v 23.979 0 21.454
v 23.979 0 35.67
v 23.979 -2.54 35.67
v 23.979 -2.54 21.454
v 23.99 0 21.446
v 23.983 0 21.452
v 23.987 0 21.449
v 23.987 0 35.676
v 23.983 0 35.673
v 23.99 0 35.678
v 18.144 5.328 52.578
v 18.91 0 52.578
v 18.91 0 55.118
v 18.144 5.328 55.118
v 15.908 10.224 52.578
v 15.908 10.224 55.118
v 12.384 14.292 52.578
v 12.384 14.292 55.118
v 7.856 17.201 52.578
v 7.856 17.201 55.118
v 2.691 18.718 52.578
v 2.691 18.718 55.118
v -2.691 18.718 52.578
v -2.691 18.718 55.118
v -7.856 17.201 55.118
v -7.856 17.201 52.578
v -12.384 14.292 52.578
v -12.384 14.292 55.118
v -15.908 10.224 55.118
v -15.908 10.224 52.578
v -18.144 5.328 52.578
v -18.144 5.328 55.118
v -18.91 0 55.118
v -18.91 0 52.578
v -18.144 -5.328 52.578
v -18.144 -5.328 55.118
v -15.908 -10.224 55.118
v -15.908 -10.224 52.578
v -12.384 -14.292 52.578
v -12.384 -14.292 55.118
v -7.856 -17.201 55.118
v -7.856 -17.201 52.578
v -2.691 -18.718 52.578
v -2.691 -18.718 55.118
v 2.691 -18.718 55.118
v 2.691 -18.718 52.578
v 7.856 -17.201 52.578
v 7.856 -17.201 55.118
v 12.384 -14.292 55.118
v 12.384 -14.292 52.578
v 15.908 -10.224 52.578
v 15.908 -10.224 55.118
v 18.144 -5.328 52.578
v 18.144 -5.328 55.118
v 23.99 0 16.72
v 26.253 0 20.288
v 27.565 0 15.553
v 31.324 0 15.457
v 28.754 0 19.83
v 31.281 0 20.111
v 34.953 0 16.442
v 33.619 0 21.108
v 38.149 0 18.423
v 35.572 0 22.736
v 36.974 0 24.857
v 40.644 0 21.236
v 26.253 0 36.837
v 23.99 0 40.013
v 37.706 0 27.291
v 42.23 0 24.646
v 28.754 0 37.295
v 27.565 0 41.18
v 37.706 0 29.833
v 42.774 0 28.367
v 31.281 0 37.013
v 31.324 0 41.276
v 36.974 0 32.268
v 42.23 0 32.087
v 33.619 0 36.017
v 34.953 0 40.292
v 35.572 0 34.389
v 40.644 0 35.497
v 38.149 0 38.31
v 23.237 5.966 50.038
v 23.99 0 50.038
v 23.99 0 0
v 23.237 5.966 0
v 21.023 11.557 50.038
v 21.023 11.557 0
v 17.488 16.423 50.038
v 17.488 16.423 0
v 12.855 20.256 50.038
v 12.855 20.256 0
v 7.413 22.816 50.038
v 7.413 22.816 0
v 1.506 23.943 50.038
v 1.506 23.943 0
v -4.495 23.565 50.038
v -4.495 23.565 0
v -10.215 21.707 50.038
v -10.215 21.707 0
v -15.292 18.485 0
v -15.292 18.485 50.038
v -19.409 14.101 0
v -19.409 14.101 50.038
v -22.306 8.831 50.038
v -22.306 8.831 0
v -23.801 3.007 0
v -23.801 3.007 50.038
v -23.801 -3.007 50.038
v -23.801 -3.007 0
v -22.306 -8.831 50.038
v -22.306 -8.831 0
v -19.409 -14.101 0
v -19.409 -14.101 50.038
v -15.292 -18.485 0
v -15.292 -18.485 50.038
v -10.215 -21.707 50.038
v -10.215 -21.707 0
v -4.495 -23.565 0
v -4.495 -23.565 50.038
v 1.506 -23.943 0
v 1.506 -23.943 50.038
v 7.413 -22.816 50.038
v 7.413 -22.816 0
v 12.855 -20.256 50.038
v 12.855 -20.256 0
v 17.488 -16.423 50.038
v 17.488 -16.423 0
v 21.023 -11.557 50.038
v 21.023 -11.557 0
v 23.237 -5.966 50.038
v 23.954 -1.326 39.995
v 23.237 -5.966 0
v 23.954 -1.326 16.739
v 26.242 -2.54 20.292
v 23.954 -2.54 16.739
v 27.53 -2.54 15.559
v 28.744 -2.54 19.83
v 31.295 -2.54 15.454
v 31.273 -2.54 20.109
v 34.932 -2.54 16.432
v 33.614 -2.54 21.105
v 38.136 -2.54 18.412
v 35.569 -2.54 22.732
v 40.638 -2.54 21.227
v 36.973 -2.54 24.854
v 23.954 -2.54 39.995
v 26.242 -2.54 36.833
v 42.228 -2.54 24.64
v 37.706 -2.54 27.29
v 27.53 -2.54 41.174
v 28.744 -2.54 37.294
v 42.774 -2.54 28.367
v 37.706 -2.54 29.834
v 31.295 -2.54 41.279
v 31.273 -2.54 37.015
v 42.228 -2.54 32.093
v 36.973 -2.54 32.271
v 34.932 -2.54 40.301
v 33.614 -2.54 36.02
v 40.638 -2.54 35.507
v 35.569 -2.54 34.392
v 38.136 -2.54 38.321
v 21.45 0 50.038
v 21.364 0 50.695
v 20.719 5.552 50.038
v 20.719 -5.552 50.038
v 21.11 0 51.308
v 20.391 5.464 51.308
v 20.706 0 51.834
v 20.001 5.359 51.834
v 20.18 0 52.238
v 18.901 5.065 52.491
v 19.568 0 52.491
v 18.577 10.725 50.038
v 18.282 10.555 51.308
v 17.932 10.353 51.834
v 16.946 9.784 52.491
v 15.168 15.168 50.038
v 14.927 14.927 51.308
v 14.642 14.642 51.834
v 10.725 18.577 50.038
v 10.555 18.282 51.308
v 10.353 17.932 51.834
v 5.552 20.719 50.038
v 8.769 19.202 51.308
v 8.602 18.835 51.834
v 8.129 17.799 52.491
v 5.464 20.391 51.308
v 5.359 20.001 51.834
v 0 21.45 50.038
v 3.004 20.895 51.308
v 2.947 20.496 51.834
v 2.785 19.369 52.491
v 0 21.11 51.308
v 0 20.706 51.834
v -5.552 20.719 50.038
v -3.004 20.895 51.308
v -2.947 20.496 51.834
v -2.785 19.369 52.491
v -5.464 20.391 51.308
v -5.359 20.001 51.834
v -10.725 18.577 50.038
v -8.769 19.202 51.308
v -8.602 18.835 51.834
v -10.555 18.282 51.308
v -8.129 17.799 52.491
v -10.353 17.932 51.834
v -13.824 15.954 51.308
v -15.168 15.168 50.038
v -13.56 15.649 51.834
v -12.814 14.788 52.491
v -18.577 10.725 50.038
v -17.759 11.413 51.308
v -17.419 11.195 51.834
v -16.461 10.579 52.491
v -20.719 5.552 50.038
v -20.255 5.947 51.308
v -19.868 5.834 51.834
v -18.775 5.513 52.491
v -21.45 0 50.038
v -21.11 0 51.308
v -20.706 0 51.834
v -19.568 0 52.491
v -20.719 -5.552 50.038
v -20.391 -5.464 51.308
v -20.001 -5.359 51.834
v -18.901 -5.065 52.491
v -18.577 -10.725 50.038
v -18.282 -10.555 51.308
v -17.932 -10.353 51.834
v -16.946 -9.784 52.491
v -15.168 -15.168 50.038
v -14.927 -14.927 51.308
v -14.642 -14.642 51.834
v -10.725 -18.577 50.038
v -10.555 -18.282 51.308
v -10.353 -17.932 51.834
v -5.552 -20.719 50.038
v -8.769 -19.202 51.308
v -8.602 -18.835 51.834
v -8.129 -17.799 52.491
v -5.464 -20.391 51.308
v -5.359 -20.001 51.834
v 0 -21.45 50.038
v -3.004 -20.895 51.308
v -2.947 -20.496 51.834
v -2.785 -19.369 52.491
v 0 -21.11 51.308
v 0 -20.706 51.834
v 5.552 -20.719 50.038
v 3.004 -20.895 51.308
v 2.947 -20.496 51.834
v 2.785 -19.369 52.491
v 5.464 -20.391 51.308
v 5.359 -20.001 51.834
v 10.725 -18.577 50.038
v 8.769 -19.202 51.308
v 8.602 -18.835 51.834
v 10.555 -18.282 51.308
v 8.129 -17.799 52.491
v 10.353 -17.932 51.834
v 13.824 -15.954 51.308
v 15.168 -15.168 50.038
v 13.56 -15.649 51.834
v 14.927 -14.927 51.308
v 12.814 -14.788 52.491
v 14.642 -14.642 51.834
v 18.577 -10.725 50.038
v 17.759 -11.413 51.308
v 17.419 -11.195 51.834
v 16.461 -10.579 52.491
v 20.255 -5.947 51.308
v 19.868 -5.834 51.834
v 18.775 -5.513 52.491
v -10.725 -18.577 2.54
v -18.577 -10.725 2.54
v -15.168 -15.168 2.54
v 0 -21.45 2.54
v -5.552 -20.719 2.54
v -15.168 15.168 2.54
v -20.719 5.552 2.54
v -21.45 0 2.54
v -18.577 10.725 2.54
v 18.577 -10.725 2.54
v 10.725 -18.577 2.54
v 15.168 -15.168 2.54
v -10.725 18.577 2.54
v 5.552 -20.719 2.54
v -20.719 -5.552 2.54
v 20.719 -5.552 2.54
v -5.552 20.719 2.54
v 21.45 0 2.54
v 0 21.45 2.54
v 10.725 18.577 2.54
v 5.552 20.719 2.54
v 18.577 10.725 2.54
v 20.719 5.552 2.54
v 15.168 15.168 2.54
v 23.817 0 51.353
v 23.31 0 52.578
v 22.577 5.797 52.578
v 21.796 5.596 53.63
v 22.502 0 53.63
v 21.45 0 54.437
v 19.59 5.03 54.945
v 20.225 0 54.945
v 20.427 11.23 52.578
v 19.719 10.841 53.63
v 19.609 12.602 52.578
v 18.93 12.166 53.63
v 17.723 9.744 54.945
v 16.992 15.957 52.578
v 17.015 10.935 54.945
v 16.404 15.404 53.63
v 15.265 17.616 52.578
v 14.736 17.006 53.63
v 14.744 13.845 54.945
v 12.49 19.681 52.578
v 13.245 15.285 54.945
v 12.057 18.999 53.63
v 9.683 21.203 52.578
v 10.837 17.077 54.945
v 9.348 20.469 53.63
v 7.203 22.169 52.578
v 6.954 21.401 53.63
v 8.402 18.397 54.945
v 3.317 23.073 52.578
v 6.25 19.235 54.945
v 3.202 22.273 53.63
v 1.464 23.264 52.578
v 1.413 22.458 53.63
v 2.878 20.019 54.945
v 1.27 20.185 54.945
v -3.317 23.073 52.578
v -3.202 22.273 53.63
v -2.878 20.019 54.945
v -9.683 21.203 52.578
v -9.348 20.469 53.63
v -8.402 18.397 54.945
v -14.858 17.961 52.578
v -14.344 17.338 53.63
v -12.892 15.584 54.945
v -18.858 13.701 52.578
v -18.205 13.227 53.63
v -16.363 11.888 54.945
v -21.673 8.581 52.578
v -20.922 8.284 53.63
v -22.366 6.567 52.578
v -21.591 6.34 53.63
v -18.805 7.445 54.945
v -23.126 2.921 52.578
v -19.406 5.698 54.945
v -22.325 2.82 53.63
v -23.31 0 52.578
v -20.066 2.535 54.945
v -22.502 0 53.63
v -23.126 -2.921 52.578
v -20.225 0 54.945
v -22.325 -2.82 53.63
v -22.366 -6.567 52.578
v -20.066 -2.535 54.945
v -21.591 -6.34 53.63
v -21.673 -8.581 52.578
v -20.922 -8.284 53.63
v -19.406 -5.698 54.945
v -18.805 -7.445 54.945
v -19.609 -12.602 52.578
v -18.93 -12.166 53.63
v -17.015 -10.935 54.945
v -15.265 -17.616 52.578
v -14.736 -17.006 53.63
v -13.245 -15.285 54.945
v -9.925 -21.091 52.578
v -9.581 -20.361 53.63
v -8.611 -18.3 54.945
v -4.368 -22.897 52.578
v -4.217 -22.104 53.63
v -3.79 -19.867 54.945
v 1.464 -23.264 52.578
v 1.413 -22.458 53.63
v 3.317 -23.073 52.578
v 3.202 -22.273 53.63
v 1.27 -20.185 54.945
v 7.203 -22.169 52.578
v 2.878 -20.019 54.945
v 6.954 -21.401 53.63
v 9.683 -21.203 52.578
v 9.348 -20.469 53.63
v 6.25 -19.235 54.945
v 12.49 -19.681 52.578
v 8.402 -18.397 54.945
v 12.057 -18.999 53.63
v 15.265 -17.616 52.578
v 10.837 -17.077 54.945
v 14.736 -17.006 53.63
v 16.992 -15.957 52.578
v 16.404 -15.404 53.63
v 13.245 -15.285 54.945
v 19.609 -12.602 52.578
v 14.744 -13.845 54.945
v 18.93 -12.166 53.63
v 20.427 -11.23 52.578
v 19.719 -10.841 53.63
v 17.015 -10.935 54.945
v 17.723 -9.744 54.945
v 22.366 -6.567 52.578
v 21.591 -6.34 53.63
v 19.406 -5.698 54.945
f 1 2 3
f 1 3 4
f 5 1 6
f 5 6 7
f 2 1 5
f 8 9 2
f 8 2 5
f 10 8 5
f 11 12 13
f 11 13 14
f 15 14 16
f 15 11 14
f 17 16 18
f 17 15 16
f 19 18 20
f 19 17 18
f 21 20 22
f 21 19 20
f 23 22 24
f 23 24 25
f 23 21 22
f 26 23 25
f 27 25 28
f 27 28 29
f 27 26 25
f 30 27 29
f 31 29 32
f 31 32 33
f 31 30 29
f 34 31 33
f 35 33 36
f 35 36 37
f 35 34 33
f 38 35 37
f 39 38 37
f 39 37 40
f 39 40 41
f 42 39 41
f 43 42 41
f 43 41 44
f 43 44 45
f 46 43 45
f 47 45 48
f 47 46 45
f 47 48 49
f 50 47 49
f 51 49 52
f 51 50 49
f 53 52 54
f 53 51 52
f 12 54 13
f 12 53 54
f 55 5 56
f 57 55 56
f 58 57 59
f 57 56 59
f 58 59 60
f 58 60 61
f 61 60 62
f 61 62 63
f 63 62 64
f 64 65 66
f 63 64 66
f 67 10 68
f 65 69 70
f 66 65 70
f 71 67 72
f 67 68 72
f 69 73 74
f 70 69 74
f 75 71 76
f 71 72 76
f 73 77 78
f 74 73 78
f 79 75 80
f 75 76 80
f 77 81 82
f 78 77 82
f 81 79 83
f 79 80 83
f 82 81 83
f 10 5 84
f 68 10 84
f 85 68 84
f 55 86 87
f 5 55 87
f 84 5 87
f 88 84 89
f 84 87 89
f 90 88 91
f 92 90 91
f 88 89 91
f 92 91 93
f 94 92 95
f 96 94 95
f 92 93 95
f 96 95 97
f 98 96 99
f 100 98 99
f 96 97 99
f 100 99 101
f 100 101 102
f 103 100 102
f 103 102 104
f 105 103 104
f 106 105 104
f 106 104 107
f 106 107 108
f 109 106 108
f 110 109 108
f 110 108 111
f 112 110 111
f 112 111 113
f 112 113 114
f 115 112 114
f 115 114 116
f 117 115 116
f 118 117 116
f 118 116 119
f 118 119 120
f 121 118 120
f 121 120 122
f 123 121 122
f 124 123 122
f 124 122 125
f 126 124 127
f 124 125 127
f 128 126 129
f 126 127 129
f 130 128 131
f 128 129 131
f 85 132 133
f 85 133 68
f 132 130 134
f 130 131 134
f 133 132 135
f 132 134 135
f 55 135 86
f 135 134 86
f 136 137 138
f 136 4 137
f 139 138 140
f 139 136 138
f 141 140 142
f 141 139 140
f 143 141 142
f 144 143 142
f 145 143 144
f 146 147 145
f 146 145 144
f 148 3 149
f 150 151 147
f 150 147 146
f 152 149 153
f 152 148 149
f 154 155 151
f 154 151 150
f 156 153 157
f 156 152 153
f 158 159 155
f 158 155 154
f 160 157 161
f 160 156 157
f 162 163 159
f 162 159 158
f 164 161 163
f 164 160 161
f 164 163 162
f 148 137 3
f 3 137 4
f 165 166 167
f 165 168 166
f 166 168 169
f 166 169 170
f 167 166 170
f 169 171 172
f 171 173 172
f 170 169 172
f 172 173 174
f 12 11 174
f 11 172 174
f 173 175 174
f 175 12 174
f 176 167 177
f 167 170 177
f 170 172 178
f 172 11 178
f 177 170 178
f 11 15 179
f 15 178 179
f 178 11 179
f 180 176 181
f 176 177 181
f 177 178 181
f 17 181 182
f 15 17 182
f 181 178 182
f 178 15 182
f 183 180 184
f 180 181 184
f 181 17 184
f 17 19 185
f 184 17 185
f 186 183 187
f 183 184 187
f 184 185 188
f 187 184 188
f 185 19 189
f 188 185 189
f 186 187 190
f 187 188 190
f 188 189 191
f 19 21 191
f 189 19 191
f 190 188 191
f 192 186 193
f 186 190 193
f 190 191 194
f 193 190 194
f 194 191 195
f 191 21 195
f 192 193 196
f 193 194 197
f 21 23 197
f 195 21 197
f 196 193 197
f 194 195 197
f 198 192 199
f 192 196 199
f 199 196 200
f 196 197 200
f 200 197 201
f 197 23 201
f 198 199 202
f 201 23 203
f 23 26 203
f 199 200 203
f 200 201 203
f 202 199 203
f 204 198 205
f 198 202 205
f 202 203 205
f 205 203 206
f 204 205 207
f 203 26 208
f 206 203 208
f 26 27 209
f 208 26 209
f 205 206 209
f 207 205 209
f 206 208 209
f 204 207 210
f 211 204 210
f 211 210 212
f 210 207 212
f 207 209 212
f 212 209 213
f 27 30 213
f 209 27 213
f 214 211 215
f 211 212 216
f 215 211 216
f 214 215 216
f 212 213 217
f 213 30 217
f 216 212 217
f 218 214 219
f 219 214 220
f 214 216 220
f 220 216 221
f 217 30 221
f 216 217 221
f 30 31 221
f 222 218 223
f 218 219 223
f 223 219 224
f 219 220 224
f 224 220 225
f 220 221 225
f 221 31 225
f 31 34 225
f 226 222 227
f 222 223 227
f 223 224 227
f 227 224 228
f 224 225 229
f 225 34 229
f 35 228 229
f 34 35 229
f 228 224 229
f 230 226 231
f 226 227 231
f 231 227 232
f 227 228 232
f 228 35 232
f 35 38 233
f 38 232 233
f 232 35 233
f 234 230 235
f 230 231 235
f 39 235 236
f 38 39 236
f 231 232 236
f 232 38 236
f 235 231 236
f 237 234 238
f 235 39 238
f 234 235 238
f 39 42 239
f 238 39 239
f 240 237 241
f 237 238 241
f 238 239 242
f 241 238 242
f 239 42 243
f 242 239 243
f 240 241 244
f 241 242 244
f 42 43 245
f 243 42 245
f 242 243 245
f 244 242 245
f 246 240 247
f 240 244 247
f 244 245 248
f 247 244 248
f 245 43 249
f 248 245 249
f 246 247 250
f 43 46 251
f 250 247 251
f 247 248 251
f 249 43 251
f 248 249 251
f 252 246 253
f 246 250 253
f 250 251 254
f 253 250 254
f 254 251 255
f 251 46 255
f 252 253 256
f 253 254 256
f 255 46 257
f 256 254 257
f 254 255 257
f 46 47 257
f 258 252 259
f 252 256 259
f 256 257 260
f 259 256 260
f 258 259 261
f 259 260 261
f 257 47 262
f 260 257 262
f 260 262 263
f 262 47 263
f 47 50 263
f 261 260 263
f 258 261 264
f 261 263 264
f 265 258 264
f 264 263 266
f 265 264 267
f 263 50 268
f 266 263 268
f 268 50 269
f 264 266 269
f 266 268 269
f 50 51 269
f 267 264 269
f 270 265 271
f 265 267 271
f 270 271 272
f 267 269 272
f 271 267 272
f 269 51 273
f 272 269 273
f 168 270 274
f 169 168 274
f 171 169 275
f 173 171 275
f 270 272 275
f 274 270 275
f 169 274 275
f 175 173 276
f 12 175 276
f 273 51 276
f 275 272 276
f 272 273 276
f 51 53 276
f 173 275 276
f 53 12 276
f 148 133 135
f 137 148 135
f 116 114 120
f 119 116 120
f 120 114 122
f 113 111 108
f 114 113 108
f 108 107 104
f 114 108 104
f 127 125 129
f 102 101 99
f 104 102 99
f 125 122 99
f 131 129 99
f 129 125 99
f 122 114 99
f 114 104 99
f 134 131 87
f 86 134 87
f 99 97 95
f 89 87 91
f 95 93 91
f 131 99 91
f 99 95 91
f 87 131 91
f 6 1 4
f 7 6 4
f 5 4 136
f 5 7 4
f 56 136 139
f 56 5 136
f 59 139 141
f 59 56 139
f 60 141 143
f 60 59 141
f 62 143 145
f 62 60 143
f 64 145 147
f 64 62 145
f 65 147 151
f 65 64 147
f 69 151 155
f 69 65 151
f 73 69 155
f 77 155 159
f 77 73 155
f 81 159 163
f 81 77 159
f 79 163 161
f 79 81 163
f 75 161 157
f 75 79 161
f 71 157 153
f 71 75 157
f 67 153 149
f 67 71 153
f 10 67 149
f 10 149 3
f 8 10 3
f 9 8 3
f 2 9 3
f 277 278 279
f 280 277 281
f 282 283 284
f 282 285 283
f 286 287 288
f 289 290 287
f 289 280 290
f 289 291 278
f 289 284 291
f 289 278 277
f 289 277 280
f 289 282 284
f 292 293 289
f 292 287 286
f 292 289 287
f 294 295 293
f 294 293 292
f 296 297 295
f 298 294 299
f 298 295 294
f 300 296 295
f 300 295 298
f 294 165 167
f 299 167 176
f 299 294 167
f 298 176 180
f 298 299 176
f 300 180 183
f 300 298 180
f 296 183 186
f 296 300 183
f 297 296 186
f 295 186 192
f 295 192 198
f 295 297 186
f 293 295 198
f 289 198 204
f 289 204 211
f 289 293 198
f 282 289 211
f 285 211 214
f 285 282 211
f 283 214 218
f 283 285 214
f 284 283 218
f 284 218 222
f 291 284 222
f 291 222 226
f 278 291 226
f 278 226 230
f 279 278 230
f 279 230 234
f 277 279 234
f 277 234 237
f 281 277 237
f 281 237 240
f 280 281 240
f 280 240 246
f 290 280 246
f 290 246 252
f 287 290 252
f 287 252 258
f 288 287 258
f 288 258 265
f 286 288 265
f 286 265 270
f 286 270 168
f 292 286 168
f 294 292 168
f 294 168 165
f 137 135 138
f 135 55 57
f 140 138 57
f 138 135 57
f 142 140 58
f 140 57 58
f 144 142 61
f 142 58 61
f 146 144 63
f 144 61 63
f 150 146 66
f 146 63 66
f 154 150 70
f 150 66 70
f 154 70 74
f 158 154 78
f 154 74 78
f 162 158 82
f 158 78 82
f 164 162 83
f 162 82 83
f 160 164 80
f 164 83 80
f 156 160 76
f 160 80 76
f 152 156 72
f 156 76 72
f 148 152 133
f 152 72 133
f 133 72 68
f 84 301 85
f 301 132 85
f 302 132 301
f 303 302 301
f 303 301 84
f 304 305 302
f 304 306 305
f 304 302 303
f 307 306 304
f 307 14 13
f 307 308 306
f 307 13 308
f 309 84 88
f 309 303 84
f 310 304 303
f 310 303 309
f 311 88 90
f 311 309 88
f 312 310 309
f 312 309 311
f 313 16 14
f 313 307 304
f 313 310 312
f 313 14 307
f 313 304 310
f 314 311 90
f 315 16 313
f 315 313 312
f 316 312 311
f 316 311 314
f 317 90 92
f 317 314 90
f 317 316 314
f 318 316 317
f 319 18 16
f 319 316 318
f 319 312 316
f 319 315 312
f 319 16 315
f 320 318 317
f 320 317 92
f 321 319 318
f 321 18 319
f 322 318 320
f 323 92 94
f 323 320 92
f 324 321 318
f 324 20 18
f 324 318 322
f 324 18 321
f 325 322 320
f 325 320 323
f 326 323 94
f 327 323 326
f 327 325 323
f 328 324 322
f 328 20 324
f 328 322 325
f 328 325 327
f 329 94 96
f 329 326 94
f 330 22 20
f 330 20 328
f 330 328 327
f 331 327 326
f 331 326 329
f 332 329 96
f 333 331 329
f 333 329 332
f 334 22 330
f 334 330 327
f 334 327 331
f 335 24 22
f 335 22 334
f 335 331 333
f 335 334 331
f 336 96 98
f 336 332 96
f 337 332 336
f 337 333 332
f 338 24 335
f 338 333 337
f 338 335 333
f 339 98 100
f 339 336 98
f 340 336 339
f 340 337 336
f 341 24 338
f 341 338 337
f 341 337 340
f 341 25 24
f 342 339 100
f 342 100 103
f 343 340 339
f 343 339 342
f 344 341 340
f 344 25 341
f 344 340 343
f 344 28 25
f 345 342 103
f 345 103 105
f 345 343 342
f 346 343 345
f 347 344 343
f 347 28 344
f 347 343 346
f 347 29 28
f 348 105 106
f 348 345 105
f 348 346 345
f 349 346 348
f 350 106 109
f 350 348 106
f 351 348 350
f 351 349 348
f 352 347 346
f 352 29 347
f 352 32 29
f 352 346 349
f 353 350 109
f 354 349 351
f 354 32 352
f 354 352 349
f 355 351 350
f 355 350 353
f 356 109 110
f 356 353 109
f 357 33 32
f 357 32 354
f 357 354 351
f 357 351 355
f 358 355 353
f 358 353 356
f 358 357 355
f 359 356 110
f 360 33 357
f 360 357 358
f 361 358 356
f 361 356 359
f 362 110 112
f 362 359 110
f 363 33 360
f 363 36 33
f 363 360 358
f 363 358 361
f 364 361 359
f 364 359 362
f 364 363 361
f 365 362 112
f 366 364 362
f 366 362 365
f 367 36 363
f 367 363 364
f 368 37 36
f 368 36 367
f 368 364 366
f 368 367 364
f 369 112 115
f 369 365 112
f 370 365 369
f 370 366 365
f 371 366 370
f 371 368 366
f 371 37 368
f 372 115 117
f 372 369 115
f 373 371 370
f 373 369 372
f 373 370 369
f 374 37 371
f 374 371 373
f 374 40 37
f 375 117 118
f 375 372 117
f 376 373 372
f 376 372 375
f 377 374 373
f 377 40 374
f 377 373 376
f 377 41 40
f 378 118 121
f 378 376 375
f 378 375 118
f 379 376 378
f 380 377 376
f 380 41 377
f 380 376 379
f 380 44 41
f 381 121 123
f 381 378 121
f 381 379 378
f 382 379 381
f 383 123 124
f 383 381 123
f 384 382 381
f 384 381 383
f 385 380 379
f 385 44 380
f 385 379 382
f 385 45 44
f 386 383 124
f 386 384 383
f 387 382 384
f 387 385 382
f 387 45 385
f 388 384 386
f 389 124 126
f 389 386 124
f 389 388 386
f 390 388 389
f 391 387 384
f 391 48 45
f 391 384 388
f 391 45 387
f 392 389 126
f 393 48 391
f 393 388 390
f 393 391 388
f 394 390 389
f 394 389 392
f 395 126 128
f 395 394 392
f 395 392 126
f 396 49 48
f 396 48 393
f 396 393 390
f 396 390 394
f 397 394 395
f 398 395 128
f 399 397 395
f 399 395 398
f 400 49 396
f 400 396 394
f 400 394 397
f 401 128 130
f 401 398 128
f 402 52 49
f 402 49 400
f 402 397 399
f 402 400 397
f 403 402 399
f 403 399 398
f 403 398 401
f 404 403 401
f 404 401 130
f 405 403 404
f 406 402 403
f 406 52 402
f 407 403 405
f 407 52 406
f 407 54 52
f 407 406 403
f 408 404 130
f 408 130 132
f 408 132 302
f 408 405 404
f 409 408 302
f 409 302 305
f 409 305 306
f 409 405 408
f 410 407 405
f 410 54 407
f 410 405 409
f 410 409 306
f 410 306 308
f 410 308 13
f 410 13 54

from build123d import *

# Parameters (mm, degrees)
F0_R     = 23.9903837703
F1_DEPTH = 55.118
F2_R     = 5.08
F3_T     = -2.54
F5_DEPTH = 2.54
F7_DEPTH = 4.1402


# Not quite as in the source:
# - a shell that OpenCascade refuses in one call is made with other operations: the cavity is built on its own and cut out


with BuildPart() as f1:
    # F0 (on Top) → F1 (new body)
    with BuildSketch(Plane.XY):
        Circle(F0_R)
    extrude(amount=F1_DEPTH)

    # F2
    f2_edges = [f1.edges().sort_by_distance(p)[0] for p in [
        (-23.990384, 0, 55.118),
    ]]
    fillet(f2_edges, radius=F2_R)

    # F3: a shell. OpenCascade refuses it in one call, so the cavity is built on its own and cut out:
    # the body offset inwards by the wall thickness, plus a prism from it out through each open face.
    f3_core = offset(f1.part, amount=F3_T, mode=Mode.PRIVATE)
    f3_exits = [f3_core.faces().sort_by_distance(p)[0] for p in [
        (0, 0, 52.578),
    ]]
    add(f3_core, mode=Mode.SUBTRACT)
    extrude(f3_exits, amount=-F3_T, mode=Mode.SUBTRACT)

    # F4 (on Front) → F5 (join)
    with BuildSketch(Plane.XZ):
        with BuildLine():
            ThreePointArc((23.9537265152, 16.7385414243), (42.7735621339, 28.3666290343), (23.9537265152, 39.9947166443))
            Line((23.9537265152, 39.9947166443), (23.9537265152, 16.7385414243))
        make_face()
    extrude(amount=F5_DEPTH)

    # F6 (on Front) → F7 (cut)
    with BuildSketch(Plane.XZ):
        with BuildLine():
            ThreePointArc((23.9792838693, 21.4542429894), (37.798657028, 28.5622673109), (23.9792838693, 35.6702916324))
            Line((23.9792838693, 35.6702916324), (23.9792838693, 21.4542429894))
        make_face()
    extrude(amount=F7_DEPTH, mode=Mode.SUBTRACT)


solid = f1.part
